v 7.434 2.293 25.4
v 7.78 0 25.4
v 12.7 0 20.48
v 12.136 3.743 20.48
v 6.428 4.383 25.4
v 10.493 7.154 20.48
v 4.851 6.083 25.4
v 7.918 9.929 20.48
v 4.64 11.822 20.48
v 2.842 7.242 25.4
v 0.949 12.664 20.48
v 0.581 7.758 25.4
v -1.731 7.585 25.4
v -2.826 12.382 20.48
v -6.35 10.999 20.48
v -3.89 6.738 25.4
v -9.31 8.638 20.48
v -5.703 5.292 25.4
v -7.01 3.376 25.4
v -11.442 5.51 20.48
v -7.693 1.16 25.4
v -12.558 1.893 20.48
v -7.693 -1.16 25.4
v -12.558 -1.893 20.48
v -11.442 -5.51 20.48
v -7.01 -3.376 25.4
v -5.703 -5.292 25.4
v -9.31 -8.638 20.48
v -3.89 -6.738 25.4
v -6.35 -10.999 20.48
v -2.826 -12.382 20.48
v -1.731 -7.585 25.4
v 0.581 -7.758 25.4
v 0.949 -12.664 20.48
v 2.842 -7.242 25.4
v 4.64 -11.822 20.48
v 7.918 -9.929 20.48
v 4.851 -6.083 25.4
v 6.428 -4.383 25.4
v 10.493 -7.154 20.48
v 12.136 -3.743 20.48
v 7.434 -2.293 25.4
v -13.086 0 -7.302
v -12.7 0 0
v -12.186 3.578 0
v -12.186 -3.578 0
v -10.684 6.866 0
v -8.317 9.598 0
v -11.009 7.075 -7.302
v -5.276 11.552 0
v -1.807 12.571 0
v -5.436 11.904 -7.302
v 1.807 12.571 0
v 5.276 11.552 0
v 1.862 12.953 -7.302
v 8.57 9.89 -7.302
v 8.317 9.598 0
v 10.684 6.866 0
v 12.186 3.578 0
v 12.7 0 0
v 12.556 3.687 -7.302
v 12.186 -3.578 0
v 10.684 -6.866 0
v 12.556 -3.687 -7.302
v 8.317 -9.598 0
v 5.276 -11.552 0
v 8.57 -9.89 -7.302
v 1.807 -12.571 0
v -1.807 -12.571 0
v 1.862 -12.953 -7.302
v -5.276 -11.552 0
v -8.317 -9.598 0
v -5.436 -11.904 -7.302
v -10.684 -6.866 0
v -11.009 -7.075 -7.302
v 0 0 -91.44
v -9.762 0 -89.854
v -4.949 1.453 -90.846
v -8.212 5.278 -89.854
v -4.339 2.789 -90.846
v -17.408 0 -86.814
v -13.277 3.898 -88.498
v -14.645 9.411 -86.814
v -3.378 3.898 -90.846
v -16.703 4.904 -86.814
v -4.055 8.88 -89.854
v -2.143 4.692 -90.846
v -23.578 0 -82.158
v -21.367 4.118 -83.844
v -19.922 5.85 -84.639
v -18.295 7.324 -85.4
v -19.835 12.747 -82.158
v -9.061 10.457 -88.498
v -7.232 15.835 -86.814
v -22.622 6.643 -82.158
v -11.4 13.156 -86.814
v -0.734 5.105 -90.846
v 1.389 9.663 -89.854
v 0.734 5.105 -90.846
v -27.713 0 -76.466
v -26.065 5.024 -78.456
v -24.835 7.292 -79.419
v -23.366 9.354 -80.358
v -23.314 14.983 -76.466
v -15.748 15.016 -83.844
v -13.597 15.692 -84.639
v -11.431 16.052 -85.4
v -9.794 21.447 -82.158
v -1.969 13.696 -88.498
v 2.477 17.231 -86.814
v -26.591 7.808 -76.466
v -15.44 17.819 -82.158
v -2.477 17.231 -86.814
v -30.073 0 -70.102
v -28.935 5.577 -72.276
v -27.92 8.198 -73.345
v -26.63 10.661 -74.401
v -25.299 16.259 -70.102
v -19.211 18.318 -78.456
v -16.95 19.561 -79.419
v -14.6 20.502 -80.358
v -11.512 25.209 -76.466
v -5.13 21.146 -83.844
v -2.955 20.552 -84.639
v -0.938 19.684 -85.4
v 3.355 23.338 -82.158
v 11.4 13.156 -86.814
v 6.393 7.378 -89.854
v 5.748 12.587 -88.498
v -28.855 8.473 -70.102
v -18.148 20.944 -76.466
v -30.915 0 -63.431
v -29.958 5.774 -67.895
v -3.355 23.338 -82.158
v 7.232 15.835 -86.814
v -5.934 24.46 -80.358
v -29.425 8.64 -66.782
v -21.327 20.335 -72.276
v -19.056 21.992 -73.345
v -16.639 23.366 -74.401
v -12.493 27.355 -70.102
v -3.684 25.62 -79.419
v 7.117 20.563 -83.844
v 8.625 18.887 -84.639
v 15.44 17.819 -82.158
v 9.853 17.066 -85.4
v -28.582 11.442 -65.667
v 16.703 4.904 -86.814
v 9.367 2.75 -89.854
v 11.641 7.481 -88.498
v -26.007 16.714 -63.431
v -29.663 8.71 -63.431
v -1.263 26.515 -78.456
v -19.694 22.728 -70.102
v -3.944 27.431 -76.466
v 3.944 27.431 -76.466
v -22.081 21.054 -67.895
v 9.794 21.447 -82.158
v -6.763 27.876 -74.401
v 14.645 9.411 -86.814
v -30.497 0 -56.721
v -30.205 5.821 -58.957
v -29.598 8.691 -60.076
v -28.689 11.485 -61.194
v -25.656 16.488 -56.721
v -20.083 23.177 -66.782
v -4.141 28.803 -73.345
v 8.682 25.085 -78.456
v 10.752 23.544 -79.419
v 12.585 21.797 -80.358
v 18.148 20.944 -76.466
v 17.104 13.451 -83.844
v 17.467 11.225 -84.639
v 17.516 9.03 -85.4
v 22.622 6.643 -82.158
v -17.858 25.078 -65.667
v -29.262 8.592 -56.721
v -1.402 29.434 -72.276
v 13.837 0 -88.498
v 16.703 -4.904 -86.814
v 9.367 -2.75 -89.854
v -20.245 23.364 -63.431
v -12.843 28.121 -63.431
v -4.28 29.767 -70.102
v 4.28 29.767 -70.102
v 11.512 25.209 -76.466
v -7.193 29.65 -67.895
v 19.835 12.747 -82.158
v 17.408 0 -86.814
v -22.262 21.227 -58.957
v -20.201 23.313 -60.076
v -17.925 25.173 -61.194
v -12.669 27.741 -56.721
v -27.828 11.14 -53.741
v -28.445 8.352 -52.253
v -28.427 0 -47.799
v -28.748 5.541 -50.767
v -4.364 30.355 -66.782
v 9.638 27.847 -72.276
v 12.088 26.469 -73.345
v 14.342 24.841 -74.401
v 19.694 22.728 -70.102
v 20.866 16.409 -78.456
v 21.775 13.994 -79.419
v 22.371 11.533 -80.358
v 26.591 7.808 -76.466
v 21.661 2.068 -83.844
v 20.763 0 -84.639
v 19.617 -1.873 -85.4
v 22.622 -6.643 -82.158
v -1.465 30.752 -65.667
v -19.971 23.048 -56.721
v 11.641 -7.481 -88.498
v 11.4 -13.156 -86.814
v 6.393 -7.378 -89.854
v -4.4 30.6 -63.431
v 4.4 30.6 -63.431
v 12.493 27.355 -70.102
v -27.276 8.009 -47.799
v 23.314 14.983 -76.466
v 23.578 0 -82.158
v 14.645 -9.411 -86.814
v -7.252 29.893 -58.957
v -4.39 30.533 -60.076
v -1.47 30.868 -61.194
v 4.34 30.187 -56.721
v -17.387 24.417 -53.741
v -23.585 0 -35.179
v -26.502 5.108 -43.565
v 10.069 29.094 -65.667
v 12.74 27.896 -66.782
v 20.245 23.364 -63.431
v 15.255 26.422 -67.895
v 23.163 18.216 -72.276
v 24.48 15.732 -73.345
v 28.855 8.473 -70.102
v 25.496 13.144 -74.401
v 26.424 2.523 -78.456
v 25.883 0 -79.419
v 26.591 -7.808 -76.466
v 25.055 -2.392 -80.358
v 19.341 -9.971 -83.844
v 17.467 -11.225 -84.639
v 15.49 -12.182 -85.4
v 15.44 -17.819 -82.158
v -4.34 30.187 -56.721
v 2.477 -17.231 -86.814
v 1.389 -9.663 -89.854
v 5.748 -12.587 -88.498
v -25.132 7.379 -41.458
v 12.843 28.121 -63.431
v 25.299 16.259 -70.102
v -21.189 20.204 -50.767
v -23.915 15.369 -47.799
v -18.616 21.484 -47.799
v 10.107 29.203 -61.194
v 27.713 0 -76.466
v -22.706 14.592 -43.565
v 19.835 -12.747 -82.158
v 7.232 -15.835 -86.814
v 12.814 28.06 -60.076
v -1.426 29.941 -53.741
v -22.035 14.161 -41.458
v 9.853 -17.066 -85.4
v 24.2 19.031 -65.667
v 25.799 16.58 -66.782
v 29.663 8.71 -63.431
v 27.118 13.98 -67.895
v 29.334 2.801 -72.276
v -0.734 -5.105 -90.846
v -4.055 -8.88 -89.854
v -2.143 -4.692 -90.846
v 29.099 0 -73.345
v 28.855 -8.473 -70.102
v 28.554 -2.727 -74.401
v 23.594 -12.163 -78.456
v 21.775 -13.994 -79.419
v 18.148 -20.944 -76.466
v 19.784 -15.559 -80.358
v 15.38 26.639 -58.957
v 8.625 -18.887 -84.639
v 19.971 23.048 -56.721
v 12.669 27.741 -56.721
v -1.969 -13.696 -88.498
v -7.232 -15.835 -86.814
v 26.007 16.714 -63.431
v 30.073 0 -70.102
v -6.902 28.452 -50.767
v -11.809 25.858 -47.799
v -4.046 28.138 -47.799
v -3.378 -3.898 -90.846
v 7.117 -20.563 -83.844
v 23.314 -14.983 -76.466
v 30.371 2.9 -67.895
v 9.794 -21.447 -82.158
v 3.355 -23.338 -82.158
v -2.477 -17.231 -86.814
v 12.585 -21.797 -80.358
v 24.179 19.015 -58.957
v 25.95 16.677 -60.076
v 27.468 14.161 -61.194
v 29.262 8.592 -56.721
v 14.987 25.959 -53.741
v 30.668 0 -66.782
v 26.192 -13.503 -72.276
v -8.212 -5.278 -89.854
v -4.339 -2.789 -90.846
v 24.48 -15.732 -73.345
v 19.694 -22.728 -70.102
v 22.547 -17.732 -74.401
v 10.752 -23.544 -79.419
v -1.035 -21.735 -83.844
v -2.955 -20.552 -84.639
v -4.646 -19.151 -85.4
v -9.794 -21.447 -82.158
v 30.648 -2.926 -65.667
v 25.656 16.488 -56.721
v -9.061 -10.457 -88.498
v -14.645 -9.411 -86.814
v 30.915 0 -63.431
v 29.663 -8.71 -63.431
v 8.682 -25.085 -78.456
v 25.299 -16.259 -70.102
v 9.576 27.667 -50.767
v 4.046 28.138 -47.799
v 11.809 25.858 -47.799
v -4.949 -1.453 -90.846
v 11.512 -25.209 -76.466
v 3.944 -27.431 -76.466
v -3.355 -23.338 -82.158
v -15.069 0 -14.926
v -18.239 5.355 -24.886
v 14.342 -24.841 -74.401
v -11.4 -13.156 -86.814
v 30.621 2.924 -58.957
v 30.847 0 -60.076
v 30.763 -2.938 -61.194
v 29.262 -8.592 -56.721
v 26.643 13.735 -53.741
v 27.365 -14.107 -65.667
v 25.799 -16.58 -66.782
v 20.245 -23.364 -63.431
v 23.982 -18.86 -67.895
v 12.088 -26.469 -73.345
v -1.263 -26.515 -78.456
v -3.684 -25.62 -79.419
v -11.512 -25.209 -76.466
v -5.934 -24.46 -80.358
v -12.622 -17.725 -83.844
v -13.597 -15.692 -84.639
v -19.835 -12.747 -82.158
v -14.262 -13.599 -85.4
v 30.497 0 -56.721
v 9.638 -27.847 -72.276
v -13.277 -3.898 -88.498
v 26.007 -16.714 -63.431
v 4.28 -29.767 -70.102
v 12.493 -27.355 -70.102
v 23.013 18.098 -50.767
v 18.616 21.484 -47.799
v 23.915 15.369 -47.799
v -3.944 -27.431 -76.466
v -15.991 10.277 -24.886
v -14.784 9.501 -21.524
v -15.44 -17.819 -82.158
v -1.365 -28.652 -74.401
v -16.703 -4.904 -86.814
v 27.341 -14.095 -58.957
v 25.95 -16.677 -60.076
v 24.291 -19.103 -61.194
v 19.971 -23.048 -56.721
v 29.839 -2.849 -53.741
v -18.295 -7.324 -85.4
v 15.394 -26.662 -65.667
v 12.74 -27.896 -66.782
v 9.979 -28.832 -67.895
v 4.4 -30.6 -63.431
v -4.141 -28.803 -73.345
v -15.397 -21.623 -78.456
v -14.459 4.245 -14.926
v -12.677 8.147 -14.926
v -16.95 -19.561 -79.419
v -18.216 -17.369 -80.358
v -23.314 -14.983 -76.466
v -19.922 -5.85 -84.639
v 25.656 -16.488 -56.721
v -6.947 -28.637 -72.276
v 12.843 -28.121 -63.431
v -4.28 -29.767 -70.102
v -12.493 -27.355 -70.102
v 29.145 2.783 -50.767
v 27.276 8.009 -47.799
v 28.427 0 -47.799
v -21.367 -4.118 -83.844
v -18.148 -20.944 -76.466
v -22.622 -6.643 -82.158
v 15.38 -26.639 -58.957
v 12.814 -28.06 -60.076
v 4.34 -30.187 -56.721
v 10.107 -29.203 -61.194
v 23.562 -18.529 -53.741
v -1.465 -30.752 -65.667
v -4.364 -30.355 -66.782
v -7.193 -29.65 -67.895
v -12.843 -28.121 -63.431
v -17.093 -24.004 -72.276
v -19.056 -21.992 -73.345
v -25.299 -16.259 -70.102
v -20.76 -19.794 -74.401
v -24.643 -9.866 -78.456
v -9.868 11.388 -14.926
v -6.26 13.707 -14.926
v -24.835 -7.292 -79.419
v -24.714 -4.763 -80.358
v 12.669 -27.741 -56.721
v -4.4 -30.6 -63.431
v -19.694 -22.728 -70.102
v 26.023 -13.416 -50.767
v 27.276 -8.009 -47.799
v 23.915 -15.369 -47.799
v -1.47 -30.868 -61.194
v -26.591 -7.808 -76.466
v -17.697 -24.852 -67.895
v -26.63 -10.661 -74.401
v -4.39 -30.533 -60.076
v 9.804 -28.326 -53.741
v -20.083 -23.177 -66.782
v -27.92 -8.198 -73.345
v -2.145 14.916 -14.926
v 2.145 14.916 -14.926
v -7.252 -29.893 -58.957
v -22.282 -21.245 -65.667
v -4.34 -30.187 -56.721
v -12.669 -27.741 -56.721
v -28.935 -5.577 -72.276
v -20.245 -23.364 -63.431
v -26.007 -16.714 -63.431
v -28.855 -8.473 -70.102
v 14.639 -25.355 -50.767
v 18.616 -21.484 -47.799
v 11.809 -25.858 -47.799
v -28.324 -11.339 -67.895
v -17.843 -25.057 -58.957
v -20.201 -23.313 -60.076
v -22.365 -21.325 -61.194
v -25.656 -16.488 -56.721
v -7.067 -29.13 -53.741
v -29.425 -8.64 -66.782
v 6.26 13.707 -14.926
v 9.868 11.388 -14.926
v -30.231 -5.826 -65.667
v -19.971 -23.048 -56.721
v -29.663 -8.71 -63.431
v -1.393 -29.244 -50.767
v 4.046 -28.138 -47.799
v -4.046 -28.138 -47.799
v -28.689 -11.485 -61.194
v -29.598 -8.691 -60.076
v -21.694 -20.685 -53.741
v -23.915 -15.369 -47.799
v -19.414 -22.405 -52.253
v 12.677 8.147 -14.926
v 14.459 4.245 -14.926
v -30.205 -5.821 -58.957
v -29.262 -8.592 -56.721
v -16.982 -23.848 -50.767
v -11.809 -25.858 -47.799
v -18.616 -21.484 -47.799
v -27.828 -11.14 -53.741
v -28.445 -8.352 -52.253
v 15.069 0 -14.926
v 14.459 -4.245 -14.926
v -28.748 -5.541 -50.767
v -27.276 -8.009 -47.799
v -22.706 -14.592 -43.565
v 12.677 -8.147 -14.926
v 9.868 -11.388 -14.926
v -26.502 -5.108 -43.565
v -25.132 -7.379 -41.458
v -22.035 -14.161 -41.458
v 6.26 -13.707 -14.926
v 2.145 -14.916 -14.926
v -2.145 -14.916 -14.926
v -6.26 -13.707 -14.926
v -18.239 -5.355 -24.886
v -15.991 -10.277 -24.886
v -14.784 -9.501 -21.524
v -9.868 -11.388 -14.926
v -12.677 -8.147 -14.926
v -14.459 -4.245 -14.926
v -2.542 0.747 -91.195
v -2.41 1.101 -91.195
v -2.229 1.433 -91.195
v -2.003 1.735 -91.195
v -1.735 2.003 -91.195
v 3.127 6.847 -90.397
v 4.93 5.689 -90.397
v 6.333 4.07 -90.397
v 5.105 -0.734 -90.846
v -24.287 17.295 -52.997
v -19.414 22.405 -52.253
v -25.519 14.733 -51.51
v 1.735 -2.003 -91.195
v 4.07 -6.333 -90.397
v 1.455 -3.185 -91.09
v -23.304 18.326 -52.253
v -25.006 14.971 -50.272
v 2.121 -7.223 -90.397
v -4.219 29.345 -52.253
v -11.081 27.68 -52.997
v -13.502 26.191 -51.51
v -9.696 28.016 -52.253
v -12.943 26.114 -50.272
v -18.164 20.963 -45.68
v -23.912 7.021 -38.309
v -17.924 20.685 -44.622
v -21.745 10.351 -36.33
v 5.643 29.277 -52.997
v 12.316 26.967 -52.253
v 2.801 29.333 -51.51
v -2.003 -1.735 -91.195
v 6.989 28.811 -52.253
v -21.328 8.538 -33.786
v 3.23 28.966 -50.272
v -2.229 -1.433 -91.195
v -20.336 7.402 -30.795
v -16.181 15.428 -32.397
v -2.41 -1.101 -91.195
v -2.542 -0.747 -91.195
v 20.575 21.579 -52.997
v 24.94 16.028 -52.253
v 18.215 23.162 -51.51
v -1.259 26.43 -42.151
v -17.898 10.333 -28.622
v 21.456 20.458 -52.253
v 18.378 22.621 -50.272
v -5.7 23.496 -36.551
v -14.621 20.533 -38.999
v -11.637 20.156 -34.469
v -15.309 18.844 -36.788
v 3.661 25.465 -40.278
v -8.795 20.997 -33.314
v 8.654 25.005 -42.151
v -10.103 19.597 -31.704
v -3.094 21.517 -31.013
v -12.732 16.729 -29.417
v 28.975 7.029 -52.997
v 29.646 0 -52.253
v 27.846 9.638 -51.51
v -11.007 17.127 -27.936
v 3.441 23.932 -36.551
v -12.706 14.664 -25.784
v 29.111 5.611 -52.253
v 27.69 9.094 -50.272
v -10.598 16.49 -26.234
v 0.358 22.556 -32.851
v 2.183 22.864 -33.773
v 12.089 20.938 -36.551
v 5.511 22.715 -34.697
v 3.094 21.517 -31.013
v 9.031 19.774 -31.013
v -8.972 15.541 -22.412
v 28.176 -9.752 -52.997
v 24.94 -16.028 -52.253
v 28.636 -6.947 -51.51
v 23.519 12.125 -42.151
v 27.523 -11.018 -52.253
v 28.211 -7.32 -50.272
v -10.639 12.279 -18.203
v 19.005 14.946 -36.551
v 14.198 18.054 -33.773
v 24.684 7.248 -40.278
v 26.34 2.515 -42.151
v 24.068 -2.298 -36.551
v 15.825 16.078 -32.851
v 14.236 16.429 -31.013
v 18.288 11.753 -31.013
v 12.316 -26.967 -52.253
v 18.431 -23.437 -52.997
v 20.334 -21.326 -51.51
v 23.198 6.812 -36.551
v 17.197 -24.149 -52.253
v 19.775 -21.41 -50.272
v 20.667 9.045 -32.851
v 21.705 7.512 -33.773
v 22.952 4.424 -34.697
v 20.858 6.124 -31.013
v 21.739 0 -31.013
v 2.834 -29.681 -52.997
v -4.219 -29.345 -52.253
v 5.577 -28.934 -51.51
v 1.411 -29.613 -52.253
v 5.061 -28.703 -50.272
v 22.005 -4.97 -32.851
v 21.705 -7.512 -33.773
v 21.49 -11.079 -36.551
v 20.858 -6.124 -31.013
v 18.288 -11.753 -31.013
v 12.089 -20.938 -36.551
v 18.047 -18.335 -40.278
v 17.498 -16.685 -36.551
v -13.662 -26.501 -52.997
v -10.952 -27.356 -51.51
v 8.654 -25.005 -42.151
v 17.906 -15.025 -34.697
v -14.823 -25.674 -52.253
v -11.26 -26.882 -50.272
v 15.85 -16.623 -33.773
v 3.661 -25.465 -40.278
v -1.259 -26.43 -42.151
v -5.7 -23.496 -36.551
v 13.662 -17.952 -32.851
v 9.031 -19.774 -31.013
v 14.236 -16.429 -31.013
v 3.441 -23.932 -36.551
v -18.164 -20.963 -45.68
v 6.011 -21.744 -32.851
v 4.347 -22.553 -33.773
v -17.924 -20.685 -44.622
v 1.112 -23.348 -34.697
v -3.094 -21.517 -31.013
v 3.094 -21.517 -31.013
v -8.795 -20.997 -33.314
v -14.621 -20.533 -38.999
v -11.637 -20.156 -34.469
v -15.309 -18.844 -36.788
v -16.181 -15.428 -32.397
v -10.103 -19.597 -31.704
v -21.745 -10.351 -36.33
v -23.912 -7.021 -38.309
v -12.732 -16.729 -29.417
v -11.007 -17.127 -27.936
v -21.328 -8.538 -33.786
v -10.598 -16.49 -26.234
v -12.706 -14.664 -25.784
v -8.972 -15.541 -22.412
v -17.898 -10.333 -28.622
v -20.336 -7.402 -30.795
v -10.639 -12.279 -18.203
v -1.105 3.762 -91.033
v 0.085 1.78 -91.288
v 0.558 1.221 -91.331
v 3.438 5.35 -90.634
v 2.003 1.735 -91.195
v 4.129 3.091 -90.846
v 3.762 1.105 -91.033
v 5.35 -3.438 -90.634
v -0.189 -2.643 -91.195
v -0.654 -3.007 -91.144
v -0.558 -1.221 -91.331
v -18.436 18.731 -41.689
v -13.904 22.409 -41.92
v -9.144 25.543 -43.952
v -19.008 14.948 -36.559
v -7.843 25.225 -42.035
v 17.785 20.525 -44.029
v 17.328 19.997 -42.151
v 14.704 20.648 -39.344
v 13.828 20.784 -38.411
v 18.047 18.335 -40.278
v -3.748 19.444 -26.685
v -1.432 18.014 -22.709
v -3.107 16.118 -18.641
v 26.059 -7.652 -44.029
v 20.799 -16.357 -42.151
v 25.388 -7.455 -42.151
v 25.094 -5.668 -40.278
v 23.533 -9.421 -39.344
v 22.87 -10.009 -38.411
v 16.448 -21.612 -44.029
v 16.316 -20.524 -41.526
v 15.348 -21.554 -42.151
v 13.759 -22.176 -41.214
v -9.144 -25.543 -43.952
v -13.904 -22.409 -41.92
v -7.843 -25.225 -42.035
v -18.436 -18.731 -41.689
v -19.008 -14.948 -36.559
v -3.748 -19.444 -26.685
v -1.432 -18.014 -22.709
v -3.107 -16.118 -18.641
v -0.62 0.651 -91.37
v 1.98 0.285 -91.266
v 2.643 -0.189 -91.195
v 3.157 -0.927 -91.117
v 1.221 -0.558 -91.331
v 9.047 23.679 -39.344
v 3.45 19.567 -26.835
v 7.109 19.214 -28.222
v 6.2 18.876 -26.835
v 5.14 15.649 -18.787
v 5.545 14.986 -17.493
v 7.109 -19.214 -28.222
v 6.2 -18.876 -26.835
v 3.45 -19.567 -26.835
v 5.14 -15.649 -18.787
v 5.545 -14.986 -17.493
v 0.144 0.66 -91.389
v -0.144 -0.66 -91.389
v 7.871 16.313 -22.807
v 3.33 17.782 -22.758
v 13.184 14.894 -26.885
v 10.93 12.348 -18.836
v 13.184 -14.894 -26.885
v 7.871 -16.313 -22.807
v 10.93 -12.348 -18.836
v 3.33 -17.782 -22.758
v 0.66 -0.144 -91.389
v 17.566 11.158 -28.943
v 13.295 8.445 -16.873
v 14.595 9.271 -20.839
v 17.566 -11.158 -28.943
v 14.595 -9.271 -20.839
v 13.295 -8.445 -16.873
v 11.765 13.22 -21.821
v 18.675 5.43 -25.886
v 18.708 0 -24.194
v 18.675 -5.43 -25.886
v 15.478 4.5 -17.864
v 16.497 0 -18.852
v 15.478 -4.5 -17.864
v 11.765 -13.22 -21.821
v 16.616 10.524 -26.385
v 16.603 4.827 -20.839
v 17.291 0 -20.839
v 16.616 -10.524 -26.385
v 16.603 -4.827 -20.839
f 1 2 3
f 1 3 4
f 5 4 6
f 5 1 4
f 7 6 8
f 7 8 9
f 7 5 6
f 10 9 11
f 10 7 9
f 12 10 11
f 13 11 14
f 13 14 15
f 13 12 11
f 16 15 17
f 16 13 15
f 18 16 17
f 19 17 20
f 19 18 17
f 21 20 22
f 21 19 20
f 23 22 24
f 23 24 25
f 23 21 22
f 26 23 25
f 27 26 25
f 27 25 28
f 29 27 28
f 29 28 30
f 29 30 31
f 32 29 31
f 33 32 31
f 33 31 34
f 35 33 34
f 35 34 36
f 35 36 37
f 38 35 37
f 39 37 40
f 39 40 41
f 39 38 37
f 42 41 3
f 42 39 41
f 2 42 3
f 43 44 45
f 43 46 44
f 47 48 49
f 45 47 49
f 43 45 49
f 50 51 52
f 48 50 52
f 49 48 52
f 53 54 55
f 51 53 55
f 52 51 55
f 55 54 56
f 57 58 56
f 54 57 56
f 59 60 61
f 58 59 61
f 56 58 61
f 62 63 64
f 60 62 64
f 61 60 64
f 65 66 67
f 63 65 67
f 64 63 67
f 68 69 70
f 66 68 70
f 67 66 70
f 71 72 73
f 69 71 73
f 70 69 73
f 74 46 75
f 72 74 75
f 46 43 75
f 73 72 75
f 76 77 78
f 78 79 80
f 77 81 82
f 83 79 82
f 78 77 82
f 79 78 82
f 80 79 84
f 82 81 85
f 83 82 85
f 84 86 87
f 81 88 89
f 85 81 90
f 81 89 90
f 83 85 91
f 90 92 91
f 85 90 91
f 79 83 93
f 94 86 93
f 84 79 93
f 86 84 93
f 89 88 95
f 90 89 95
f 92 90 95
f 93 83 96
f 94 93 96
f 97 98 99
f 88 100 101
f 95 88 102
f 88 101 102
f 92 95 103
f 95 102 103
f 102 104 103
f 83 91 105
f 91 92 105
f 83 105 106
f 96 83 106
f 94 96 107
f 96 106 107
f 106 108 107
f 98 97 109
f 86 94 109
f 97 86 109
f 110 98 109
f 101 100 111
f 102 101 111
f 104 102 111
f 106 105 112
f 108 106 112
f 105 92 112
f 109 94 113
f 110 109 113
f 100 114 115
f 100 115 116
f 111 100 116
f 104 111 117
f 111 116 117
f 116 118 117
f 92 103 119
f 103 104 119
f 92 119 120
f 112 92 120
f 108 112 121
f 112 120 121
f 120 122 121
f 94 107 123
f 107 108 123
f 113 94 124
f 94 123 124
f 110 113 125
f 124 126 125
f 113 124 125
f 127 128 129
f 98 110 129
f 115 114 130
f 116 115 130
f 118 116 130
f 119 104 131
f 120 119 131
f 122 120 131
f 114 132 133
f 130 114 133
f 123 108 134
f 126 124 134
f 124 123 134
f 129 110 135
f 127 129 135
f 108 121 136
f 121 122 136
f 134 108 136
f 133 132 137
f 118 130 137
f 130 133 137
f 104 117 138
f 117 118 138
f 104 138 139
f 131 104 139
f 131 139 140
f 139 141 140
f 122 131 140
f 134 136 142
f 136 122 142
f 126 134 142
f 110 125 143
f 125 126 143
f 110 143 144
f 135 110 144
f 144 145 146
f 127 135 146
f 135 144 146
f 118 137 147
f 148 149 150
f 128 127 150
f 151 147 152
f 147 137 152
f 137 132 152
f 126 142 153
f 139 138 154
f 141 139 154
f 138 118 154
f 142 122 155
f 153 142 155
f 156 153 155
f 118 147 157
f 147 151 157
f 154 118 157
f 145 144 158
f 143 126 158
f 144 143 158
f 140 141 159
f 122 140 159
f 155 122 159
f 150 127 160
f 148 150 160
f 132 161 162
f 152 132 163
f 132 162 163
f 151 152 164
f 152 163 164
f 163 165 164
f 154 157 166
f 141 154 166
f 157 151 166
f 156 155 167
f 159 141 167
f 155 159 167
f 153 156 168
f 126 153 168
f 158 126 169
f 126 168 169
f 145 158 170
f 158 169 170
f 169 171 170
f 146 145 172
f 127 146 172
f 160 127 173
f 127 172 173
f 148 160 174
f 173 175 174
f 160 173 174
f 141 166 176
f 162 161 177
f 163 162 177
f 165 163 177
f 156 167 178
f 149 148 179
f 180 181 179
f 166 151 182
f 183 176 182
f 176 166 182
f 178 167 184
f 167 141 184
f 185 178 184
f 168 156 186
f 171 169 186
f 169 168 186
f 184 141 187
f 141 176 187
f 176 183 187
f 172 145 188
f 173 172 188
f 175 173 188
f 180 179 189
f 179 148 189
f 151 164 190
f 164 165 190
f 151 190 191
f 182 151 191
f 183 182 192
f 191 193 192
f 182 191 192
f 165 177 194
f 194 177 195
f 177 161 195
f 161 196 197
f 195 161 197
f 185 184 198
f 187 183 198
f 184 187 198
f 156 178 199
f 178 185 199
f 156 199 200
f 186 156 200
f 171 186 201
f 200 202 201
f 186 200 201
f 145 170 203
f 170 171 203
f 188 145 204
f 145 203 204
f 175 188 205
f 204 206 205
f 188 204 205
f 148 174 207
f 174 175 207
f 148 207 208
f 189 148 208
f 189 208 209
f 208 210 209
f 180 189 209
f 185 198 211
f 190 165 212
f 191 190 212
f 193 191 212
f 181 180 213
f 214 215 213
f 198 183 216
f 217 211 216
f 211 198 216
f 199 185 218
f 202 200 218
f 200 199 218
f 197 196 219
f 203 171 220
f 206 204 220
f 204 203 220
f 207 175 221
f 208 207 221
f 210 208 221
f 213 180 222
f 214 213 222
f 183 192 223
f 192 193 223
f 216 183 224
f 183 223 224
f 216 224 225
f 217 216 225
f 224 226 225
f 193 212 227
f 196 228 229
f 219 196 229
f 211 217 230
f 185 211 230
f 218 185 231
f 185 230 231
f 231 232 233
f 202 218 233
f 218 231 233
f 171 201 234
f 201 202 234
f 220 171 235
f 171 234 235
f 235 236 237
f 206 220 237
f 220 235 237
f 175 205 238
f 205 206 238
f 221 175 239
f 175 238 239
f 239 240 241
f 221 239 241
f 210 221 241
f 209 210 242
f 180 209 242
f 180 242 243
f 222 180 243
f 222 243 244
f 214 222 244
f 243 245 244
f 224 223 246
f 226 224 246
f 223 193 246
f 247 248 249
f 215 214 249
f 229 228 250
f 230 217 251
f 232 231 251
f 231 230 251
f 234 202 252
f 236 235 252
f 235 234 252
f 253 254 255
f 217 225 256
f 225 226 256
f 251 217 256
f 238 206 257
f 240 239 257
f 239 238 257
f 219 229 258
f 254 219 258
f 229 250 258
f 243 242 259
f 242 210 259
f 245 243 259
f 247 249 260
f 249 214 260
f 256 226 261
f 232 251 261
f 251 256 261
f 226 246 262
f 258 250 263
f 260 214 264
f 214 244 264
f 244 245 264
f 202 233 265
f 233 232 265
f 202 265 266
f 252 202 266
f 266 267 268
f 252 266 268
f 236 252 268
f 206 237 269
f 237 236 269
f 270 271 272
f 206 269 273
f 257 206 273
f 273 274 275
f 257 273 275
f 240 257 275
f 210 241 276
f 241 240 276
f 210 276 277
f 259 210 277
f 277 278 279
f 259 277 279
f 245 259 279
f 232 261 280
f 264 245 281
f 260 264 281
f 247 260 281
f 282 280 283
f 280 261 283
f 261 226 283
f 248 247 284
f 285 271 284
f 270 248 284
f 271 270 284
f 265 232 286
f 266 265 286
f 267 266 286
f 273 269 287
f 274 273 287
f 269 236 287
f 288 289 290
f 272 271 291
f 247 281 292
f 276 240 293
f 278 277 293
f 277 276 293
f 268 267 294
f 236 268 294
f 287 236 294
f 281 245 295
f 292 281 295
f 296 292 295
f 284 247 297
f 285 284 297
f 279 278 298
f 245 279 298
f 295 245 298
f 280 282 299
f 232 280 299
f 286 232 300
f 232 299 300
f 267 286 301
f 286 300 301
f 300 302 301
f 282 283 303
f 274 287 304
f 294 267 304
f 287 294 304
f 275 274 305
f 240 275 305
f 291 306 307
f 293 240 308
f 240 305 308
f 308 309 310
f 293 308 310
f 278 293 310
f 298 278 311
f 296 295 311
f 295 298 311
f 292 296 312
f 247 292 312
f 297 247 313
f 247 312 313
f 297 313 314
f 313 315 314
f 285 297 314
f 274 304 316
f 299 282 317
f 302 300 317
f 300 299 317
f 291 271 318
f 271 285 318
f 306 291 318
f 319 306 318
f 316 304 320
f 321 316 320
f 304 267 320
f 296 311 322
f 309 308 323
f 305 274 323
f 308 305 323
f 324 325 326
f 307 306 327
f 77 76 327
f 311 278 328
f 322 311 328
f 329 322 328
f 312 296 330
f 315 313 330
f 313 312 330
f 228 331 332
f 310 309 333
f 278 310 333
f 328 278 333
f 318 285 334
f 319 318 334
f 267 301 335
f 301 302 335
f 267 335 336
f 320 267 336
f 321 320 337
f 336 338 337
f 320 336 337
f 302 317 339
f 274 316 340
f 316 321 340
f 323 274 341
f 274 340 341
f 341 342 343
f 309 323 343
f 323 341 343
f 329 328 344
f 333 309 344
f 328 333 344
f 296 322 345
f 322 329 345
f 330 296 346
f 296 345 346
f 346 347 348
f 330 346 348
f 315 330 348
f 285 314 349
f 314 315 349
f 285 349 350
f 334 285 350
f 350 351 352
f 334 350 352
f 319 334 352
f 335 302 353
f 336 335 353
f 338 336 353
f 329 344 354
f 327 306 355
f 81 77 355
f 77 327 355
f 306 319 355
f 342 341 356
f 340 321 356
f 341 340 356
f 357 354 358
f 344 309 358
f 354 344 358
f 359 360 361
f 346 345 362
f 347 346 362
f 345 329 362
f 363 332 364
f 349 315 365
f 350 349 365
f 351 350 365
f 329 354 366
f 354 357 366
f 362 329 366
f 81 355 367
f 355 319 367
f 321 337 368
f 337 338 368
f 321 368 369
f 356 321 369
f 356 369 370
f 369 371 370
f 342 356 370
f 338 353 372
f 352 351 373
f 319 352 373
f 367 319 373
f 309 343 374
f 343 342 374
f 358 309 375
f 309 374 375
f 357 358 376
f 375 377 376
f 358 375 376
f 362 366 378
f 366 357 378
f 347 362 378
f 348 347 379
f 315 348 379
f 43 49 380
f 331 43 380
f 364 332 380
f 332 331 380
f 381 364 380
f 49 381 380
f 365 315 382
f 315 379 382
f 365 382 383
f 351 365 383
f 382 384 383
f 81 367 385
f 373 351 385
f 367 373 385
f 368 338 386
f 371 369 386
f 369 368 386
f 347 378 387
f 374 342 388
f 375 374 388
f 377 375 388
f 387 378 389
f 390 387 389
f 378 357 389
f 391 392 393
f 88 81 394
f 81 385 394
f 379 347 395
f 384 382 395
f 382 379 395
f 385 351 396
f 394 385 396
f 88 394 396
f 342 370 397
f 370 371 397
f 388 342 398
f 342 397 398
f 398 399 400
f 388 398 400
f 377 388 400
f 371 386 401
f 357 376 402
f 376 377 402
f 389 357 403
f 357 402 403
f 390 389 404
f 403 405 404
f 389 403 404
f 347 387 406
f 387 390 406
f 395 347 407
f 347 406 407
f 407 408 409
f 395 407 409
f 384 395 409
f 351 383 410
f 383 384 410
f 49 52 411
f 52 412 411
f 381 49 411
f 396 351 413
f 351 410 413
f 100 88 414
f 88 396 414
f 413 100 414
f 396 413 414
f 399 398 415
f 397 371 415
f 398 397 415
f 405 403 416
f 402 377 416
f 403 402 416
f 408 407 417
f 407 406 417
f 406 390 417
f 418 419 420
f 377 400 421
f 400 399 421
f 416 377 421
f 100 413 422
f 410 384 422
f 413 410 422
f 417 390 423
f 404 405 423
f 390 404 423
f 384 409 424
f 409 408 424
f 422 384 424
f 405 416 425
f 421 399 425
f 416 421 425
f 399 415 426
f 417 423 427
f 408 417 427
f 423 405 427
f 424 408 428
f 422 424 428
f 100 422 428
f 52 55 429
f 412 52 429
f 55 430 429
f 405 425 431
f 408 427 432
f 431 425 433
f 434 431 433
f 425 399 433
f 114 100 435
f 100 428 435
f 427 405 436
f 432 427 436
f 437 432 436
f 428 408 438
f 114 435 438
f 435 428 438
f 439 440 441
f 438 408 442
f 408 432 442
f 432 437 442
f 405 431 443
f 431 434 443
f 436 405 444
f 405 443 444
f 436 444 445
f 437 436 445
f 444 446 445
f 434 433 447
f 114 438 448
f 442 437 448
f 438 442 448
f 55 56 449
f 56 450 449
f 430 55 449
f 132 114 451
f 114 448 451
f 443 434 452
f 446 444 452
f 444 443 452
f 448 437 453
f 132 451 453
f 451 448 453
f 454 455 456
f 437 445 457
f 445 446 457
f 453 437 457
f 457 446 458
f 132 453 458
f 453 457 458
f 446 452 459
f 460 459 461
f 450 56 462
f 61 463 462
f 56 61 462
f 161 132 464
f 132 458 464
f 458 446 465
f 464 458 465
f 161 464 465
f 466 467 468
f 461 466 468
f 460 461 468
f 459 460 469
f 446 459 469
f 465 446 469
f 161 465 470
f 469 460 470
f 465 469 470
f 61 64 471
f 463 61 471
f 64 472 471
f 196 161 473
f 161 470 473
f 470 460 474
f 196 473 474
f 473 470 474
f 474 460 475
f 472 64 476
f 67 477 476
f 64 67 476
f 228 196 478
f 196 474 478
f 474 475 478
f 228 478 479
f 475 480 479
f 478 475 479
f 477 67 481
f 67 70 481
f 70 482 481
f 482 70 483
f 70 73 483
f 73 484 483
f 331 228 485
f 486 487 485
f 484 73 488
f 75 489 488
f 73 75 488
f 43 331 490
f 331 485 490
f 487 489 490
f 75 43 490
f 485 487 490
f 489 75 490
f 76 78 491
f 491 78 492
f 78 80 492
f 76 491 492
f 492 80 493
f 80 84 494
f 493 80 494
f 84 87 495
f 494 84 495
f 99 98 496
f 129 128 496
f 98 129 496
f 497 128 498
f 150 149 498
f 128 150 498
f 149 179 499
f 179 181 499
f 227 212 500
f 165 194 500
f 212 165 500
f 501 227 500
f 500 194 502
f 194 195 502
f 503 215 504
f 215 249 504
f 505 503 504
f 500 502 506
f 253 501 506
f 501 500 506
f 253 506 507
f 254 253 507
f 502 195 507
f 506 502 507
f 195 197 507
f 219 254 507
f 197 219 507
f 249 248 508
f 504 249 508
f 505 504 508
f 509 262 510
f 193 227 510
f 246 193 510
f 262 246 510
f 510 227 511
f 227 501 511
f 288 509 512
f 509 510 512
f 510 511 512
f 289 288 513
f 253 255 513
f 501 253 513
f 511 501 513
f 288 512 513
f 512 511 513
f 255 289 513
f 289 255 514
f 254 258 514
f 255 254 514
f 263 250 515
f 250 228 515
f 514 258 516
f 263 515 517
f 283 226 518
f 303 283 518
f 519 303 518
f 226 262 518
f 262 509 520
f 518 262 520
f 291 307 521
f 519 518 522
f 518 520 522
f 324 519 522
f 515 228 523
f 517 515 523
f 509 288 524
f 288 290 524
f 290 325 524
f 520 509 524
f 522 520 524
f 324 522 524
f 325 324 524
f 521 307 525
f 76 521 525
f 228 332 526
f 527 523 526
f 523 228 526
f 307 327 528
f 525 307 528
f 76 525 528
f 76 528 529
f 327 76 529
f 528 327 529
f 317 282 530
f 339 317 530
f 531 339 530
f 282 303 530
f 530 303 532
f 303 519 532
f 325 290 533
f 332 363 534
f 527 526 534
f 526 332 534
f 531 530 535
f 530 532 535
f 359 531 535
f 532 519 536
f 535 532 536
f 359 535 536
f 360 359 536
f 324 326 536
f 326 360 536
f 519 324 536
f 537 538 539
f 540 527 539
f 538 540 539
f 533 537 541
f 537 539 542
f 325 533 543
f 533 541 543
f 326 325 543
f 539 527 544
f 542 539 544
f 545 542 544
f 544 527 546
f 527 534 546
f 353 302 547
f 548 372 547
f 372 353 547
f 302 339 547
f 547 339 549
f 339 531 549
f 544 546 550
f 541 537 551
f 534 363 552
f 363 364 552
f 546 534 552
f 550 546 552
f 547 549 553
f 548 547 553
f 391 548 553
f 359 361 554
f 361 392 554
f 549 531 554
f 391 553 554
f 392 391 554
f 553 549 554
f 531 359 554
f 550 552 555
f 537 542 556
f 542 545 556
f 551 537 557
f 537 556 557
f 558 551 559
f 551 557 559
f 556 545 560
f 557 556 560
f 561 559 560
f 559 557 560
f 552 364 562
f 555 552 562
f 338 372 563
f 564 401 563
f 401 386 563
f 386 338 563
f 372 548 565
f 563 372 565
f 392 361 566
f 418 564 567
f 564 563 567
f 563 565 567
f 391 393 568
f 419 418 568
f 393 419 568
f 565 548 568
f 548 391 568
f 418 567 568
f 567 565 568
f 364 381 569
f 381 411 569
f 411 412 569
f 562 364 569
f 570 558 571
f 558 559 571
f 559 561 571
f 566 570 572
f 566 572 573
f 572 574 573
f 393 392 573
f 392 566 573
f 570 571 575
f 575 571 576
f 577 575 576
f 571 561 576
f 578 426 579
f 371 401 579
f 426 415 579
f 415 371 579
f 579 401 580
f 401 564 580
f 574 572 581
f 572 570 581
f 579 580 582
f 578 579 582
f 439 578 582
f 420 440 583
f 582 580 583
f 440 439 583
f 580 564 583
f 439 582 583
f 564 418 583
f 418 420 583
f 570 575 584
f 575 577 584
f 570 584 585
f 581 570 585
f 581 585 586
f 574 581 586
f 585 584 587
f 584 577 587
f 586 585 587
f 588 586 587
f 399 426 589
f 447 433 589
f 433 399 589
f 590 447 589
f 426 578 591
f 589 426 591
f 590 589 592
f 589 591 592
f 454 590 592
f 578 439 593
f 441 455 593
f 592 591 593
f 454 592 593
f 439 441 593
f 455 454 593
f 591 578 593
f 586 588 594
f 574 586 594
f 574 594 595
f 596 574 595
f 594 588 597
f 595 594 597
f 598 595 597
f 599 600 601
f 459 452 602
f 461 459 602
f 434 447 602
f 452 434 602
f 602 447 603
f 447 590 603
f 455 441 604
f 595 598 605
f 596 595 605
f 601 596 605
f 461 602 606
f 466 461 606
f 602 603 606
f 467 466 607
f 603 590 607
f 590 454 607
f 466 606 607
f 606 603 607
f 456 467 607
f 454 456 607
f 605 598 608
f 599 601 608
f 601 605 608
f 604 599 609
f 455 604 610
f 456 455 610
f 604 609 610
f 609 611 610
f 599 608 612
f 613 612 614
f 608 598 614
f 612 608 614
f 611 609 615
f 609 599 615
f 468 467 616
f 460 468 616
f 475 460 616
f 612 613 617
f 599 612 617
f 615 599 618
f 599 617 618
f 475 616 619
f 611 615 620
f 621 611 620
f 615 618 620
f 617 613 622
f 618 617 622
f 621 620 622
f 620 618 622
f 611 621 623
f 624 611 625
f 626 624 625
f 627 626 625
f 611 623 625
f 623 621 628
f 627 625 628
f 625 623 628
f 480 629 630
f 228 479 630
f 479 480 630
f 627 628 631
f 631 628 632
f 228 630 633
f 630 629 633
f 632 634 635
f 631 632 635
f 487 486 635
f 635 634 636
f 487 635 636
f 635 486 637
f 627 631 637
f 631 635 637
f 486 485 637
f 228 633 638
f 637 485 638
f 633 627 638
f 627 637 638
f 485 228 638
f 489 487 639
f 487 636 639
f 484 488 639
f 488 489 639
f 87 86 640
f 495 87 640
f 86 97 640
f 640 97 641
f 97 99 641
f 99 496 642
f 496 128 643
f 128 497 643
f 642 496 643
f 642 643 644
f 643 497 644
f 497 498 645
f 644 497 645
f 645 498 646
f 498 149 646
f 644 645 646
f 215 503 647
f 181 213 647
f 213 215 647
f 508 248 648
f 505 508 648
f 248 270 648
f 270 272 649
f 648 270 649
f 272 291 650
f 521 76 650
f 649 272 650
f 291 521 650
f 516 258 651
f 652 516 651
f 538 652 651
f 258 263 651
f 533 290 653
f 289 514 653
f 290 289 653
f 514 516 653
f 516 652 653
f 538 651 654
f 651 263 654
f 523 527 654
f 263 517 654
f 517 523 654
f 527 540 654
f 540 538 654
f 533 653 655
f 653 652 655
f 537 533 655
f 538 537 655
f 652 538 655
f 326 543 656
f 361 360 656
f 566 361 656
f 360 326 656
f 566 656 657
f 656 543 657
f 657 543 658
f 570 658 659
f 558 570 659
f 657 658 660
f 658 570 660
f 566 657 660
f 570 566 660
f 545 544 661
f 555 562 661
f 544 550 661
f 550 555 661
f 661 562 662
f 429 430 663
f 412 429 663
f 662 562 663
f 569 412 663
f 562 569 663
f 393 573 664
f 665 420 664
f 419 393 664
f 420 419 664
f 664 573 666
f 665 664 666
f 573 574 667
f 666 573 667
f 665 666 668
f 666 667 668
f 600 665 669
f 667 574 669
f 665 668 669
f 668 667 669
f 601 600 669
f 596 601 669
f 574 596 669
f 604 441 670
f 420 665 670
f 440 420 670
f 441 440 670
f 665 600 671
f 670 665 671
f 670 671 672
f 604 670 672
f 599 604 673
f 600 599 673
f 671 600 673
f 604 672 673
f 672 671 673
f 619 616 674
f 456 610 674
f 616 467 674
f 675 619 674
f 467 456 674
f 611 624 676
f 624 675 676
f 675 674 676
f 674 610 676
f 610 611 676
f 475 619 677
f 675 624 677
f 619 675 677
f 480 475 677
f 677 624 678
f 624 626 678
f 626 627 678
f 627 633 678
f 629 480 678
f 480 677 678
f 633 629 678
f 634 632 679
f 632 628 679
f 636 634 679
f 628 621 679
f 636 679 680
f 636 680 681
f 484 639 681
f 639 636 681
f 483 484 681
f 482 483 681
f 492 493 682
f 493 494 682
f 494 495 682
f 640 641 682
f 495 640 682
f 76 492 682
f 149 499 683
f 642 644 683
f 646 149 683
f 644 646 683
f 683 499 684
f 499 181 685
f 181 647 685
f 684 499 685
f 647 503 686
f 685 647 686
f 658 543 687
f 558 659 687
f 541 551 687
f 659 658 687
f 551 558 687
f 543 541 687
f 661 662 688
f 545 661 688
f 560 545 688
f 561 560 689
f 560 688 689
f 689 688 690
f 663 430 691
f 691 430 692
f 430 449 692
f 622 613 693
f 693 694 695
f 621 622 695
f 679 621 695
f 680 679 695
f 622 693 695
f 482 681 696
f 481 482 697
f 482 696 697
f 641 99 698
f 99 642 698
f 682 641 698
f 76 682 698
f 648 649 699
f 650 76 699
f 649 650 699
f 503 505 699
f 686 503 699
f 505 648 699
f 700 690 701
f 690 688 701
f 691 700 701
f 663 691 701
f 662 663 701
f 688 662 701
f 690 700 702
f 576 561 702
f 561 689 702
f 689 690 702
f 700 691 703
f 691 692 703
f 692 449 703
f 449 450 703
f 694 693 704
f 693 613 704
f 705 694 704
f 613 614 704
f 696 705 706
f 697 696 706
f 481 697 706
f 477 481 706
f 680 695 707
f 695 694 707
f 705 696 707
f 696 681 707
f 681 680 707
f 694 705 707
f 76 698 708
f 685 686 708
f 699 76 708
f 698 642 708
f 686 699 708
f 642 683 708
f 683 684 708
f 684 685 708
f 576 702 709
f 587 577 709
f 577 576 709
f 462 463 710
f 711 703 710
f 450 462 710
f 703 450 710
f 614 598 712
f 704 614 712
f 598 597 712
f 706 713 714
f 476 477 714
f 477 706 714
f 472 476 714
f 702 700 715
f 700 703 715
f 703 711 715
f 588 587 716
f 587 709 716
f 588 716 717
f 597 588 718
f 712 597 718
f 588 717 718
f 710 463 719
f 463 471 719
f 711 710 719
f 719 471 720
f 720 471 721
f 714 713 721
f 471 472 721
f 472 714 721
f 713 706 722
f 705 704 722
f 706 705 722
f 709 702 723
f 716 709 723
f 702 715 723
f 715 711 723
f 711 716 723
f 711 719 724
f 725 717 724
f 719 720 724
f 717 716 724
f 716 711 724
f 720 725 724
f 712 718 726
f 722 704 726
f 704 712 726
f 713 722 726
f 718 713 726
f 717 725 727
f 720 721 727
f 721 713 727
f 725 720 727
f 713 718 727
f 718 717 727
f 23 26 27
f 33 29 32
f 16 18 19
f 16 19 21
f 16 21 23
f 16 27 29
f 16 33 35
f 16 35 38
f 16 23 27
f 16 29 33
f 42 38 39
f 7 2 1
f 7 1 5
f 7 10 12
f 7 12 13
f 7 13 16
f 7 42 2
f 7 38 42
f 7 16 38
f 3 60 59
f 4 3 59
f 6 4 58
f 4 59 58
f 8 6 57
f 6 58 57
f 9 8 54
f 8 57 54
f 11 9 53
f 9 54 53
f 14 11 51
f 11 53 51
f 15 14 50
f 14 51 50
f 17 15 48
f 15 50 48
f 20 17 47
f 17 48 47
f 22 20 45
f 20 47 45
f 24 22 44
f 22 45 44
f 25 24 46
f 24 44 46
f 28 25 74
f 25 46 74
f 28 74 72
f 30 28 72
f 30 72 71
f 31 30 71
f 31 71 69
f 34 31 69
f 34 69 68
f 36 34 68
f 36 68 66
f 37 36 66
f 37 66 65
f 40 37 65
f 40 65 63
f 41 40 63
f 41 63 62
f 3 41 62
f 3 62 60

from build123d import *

# Parameters (mm, degrees)
SKETCH1_R           = 12.7
BOSS_EXTRUDE1_DEPTH = 25.4
CHAMFER1_SIZE       = 4.92


with BuildPart() as part:
    # Sketch1 → Boss-Extrude1 (new body)
    with BuildSketch(Plane.XY):
        Circle(SKETCH1_R)
    extrude(amount=BOSS_EXTRUDE1_DEPTH)

    # Sketch2 → Revolve1 (revolve)
    with BuildSketch(Plane(origin=(0, 0, 0), x_dir=(1, 0, 0), z_dir=(0, 1, 0))):
        with BuildLine():
            Line((0, 0), (0, 91.44))
            add(Edge.make_bspline(
                [(0, 91.44), (-22.313297432, 89.869472139), (-44.030480488, 54.776848914), (-11.128878032, 19.035751287), (-12.7, 0)],
                knots=[0, 0, 0, 0, 0.356051471, 1, 1, 1, 1], degree=3))
            Line((-12.7, 0), (0, 0))
        make_face()
    revolve(axis=Axis((0, 0, 0), (0, 0, -1)))

    # Chamfer1
    chamfer1_edges = [part.edges().sort_by_distance(p)[0] for p in [
        (-12.7, 0, 25.4),
    ]]
    chamfer(chamfer1_edges, length=CHAMFER1_SIZE)


solid = part.part
